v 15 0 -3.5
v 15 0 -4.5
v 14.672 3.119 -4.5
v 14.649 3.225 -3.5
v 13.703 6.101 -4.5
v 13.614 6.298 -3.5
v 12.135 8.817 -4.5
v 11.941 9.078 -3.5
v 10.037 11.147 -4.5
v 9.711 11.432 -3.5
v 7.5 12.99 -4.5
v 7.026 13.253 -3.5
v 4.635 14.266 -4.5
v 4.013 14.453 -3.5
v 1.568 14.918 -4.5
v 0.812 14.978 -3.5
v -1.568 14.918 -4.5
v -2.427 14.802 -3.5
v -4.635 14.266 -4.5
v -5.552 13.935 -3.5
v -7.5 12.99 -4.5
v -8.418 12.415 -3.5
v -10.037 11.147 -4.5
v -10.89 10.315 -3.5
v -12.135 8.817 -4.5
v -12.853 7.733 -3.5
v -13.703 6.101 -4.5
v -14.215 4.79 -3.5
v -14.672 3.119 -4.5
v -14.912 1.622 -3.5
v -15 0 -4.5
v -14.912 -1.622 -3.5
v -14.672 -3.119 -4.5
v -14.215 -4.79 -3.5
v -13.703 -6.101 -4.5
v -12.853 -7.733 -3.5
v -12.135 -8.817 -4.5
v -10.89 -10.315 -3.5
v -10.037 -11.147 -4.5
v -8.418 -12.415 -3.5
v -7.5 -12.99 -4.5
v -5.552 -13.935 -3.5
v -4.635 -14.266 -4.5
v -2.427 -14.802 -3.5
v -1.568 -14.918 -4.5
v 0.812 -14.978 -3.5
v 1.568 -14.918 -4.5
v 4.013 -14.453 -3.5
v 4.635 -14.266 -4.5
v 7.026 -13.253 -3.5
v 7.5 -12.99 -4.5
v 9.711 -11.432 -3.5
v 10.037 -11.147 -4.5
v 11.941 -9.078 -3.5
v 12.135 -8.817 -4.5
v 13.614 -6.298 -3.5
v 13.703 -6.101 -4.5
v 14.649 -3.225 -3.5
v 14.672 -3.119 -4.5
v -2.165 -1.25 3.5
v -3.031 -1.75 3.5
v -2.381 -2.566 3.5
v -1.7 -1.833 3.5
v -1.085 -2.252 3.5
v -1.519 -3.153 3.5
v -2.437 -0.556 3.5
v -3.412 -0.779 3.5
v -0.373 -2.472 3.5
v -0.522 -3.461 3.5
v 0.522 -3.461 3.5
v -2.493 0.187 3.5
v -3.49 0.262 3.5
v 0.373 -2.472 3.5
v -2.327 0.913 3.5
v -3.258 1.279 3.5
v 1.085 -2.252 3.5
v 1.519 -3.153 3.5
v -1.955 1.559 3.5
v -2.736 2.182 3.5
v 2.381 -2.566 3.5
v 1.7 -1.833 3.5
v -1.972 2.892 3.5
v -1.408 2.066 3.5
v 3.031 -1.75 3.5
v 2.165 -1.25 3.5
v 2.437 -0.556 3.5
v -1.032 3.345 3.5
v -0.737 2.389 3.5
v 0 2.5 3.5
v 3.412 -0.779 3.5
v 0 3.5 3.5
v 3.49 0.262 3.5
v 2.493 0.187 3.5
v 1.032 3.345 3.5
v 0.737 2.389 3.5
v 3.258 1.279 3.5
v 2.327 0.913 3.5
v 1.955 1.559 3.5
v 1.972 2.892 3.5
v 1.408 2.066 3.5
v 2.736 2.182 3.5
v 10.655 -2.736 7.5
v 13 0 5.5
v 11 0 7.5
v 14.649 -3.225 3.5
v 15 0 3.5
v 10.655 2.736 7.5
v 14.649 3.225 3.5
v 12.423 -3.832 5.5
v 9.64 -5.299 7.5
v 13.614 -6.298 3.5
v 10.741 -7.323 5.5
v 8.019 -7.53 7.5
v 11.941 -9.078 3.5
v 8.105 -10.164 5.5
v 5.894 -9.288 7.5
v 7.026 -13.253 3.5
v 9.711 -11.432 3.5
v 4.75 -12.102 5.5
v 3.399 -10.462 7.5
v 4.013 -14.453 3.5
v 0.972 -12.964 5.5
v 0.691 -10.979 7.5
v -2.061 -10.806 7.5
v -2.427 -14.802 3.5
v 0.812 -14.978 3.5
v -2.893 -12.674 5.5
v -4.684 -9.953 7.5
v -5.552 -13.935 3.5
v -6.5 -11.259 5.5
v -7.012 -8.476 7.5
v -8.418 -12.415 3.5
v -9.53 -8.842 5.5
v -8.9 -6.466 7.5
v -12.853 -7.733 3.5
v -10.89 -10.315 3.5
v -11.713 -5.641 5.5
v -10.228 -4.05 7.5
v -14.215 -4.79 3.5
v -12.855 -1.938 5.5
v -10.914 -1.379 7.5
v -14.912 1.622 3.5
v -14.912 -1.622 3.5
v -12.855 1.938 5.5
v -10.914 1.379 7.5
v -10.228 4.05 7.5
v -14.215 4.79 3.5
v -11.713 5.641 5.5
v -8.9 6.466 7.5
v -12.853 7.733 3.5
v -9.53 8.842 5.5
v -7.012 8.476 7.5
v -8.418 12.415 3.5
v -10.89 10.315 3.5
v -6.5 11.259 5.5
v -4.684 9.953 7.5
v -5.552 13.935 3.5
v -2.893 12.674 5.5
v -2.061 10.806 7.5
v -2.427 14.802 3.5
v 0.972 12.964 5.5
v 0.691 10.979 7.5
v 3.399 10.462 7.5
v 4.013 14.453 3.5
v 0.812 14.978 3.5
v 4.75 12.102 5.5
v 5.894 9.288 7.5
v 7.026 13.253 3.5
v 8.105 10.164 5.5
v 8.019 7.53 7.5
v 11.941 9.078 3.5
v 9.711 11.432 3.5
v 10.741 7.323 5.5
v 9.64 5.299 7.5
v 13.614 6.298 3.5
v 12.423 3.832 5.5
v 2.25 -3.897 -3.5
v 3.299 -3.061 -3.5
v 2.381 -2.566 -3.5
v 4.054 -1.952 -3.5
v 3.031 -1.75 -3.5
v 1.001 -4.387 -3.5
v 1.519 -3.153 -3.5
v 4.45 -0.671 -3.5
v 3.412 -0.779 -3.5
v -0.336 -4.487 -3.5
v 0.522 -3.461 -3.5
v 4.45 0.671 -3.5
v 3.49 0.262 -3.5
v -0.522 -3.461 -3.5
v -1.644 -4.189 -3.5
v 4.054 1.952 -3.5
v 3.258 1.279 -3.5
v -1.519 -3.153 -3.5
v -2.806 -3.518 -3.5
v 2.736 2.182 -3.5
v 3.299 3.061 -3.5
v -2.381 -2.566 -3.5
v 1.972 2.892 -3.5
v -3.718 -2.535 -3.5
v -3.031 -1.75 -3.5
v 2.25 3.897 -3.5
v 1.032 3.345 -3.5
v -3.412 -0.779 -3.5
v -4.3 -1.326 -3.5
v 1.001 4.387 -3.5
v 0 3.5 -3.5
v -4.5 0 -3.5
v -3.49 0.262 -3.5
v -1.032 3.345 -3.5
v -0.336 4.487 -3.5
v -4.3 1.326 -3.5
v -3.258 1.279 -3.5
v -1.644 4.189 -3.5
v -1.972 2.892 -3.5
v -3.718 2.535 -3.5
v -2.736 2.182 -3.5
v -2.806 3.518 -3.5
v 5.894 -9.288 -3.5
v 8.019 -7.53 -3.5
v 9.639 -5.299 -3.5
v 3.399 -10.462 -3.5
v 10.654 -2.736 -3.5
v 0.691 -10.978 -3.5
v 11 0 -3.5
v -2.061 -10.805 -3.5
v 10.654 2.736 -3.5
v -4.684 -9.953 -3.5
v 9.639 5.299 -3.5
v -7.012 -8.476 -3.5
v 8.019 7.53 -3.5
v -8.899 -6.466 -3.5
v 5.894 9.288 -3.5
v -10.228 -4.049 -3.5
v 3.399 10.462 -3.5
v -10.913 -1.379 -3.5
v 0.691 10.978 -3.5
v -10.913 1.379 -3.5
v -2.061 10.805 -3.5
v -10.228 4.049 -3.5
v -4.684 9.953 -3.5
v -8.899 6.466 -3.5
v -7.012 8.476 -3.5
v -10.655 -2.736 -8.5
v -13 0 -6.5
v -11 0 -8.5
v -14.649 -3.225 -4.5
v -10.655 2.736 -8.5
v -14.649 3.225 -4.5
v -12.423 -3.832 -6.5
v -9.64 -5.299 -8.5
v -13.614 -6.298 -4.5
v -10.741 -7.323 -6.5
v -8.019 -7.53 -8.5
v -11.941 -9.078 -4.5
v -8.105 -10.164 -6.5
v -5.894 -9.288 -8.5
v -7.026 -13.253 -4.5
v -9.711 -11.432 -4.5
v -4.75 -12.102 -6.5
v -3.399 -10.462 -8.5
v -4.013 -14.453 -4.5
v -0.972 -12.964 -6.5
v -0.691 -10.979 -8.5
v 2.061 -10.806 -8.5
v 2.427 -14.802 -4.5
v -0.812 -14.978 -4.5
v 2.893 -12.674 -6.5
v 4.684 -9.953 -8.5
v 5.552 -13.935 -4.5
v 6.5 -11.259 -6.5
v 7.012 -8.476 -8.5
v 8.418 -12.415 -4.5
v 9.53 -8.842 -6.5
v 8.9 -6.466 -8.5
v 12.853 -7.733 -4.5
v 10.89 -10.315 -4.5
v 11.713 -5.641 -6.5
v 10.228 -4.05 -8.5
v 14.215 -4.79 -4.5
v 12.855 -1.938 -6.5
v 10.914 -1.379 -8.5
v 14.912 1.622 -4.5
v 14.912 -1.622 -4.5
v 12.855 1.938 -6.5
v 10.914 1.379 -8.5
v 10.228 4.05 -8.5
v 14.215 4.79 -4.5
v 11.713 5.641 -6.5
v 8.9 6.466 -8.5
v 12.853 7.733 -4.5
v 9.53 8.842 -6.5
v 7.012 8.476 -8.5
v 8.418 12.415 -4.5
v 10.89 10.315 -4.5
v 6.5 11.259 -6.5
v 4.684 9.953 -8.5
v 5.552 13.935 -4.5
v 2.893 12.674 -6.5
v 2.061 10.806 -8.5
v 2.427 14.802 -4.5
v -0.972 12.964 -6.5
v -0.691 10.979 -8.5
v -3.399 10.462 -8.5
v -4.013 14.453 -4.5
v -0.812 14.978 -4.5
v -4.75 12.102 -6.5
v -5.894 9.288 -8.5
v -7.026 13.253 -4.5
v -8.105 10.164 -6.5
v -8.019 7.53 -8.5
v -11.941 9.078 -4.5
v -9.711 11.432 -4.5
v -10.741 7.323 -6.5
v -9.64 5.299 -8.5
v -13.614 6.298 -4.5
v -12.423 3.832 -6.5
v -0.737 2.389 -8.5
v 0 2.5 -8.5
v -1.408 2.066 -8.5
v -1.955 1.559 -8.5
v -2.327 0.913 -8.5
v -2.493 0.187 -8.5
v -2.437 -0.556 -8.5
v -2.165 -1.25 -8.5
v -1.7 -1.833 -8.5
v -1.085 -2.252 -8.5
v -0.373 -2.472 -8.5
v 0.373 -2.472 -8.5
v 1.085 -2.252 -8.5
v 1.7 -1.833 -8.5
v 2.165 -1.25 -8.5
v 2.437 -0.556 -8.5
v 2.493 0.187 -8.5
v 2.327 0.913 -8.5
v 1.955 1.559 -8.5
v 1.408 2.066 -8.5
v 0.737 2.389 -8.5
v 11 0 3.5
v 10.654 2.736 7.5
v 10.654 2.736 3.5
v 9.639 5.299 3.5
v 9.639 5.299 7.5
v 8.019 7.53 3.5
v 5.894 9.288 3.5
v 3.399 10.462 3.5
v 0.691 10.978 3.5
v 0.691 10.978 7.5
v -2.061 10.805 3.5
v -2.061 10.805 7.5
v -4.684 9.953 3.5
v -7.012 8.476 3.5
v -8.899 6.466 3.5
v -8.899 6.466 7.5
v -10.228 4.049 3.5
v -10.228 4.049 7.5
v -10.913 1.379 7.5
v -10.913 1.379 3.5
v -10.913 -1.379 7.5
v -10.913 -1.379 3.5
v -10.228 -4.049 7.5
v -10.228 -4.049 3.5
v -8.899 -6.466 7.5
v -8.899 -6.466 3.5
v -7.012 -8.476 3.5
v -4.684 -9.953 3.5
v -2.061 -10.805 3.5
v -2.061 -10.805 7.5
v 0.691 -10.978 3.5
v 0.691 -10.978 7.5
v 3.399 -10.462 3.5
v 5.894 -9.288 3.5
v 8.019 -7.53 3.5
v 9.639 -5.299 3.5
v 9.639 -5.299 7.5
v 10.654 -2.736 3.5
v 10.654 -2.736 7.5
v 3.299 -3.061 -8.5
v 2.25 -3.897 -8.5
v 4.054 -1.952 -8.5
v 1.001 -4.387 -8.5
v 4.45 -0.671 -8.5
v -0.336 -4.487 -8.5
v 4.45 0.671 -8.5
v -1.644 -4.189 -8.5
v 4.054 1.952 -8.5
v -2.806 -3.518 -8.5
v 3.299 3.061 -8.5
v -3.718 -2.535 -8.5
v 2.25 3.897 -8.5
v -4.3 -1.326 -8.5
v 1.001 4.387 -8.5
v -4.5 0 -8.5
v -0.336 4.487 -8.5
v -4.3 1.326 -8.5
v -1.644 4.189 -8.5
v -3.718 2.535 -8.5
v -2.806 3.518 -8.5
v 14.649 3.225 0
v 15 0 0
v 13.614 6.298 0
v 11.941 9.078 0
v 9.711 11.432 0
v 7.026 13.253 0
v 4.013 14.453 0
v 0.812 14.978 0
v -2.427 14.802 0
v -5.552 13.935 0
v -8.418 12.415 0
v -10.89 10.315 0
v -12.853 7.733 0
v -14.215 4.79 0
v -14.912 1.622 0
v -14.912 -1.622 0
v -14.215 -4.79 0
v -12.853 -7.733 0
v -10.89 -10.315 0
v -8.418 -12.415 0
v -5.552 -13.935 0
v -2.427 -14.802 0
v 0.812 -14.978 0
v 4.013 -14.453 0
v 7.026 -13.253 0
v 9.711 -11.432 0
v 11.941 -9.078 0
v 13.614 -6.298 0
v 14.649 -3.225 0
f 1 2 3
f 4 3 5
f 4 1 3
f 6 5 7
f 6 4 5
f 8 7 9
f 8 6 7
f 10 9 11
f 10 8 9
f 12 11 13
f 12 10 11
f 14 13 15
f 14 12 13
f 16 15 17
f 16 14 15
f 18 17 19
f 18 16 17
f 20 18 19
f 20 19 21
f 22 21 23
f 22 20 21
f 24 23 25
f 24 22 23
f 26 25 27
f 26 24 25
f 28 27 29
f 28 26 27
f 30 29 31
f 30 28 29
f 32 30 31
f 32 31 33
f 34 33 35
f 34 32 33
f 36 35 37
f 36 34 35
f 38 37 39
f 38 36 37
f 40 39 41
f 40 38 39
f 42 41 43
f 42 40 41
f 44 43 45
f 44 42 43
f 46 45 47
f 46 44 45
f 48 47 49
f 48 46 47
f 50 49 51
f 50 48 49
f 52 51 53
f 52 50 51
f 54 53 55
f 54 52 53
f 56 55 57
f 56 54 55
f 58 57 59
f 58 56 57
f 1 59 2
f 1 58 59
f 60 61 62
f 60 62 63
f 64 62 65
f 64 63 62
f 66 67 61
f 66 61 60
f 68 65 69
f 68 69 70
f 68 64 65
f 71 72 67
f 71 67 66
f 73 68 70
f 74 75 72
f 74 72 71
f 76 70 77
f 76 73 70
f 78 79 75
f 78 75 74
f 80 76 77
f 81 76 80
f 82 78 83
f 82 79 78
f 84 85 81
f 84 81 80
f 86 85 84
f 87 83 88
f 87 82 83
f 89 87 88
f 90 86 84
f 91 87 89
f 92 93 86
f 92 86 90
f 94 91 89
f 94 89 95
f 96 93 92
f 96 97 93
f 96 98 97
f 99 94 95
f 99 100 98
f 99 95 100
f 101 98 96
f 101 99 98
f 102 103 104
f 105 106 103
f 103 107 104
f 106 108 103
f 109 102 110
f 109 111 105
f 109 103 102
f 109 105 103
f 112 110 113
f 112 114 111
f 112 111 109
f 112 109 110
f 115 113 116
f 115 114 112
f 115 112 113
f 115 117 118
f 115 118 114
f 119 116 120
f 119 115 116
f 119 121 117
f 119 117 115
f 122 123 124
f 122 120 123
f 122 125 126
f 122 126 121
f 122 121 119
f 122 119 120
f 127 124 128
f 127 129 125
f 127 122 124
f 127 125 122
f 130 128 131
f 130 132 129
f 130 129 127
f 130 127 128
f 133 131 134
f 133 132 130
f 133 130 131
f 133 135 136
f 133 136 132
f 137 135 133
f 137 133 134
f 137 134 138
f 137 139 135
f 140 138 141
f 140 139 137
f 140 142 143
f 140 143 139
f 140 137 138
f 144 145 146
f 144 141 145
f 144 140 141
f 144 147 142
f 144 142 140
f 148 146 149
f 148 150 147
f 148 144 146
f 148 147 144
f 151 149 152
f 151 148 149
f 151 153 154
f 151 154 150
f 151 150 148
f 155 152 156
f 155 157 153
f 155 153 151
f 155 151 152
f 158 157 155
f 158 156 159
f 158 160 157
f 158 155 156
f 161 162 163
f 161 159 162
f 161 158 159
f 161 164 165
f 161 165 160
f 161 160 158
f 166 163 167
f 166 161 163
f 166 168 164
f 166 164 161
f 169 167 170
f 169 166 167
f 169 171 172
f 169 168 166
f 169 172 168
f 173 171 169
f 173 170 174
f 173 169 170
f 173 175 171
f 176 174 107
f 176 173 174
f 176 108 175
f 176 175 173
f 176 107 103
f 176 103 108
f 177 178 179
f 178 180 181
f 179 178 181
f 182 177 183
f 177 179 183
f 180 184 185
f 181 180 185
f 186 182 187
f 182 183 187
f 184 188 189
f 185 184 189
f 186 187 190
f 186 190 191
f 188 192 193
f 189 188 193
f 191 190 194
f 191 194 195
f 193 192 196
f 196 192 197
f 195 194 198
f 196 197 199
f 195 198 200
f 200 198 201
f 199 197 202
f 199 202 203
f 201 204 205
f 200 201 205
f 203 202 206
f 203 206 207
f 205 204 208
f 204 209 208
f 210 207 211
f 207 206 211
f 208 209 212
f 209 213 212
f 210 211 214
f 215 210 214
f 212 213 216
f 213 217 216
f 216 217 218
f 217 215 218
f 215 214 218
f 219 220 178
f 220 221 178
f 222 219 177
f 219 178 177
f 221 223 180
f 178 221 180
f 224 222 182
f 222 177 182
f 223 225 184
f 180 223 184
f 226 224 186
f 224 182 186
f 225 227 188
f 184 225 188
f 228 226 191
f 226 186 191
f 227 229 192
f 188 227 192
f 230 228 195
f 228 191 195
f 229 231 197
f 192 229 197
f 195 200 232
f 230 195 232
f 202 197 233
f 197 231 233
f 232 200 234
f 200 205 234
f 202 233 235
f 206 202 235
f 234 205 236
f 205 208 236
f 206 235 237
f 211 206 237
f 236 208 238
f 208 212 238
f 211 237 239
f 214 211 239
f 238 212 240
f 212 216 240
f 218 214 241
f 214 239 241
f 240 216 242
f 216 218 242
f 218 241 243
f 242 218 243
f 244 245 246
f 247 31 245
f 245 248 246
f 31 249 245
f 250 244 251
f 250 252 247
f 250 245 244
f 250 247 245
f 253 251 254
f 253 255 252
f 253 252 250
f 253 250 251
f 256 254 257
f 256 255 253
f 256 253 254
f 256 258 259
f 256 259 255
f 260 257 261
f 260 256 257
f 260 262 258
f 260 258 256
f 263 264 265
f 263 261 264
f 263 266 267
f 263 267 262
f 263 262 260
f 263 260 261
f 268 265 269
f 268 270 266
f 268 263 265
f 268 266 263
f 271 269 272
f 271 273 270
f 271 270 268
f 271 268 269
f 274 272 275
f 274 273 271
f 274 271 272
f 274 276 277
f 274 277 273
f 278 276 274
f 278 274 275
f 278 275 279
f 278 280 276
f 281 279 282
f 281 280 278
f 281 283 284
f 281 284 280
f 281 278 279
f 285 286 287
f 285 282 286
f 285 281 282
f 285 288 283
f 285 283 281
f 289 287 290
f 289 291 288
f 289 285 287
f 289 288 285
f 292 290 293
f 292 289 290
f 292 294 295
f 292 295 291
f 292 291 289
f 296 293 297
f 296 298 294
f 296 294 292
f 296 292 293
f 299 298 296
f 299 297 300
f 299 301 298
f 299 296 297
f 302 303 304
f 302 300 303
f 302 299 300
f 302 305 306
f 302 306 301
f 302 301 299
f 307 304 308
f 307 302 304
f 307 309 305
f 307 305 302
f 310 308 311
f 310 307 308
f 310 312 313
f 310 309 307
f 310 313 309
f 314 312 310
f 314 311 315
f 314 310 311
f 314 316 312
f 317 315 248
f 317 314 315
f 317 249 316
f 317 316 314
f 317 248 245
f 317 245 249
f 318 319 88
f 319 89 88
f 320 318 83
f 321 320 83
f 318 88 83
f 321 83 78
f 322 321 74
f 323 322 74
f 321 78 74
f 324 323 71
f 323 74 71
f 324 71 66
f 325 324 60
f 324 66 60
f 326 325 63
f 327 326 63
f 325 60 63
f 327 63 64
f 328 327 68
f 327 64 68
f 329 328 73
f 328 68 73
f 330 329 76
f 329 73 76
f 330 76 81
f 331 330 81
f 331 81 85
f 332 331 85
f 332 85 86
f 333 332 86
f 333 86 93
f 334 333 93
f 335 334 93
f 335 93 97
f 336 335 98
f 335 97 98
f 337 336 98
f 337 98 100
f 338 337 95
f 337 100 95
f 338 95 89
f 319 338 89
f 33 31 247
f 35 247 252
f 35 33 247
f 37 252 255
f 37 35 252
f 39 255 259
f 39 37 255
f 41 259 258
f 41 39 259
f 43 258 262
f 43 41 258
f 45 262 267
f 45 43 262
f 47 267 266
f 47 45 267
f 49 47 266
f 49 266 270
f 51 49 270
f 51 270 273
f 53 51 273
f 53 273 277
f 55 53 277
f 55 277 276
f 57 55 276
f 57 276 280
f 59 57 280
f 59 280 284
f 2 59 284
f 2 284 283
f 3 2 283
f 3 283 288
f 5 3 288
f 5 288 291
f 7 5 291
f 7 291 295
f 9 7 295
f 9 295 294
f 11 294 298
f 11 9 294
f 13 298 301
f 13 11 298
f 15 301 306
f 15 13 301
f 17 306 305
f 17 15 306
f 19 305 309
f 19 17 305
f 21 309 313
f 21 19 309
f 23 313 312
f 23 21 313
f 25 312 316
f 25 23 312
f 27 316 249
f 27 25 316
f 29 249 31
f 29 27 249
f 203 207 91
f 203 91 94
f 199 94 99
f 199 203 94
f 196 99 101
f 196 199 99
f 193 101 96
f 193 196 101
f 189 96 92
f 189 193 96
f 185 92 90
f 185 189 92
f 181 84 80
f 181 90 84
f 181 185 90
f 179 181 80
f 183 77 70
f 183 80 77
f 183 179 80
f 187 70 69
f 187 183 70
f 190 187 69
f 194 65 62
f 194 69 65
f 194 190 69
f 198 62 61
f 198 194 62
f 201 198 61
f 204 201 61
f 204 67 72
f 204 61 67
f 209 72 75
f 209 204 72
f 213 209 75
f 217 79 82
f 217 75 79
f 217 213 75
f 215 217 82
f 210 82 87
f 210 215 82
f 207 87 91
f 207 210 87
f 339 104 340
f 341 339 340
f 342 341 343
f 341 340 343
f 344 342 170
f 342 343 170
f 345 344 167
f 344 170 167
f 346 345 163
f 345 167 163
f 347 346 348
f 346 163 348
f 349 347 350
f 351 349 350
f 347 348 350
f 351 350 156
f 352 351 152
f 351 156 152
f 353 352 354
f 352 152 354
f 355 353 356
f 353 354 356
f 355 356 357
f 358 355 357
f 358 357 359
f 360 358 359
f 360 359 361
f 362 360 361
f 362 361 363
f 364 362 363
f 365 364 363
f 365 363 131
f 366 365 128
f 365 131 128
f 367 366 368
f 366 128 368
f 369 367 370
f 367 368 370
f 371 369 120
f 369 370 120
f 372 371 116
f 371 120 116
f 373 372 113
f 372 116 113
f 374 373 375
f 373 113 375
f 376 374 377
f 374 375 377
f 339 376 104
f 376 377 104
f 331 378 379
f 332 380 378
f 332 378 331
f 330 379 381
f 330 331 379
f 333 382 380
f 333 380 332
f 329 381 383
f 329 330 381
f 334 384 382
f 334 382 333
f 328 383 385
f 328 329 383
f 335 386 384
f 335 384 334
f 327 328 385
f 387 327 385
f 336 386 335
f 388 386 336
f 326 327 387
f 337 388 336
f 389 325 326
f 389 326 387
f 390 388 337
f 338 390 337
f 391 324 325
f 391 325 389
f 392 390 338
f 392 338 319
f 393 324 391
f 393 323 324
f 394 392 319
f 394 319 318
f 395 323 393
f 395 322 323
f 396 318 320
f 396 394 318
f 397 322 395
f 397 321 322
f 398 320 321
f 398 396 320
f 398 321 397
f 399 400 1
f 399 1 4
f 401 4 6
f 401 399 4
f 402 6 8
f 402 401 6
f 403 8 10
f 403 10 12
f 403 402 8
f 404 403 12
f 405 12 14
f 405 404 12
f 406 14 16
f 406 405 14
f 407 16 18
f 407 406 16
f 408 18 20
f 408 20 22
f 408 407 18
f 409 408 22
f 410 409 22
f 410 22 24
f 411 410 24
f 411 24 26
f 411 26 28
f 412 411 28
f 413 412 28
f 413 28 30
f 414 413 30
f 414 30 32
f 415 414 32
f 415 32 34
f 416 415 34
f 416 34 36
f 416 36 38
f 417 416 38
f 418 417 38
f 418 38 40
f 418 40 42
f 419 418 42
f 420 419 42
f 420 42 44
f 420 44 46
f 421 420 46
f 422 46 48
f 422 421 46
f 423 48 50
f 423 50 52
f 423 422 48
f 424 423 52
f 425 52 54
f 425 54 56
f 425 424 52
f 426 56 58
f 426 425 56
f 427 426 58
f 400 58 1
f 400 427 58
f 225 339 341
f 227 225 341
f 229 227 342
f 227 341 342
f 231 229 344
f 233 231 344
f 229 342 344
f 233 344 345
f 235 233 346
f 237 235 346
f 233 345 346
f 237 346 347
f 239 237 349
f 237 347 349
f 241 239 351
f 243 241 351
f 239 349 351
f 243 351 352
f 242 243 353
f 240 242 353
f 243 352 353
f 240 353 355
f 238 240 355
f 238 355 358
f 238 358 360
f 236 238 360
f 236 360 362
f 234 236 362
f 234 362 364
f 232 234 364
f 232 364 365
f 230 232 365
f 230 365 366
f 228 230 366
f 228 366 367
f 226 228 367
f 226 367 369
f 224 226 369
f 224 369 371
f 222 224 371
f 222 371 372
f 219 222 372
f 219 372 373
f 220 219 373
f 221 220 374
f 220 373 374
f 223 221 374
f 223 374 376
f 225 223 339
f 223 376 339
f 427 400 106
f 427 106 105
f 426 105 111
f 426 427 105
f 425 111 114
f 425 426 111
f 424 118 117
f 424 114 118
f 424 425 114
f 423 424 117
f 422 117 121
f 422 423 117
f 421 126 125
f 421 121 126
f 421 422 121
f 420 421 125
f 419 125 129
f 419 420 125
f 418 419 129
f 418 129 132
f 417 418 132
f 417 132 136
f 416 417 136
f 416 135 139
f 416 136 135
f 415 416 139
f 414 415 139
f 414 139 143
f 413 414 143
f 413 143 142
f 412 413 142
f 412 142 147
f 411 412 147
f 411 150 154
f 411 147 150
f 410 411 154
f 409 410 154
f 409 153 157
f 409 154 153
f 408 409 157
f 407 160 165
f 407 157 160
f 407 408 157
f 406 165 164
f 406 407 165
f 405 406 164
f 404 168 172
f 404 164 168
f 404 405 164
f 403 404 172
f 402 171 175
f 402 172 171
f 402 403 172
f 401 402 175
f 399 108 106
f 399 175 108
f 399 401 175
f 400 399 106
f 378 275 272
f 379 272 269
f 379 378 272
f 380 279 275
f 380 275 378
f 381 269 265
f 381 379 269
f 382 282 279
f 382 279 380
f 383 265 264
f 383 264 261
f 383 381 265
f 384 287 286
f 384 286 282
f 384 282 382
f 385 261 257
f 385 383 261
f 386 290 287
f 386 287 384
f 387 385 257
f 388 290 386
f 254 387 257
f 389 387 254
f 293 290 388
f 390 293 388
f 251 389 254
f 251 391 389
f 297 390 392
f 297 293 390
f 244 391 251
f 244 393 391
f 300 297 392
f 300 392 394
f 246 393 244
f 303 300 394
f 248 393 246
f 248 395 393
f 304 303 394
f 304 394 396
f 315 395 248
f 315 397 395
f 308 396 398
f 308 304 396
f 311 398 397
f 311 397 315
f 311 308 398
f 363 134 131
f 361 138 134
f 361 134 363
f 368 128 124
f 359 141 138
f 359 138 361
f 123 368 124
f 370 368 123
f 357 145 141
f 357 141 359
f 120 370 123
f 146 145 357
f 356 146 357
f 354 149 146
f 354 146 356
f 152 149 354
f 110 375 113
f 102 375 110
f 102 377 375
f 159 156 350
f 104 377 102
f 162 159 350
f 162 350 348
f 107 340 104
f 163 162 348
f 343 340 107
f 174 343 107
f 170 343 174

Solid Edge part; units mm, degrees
sketch "Sketch1" plane through (0, 0, 0) normal (0, 0, 1) x (1, 0, 0)
  circle A0 centre (0, 0) radius 15
extrude "Protrusion1" add sketch "Sketch1" along normal mid plane 7
sketch "Sketch2" plane through (0, 0, 3.5) normal (0, 0, 1) x (1, 0, 0)
  circle A0 centre (0, 0) radius 11
extrude "ExtrudedCutout_2" cut sketch "Sketch2" against normal blind 28.5
sketch "Sketch3" plane through (0, 0, -3.5) normal (0, 0, -1) x (1, 0, 0)
  circle A0 centre (0, 0) radius 15
extrude "ExtrudedProtrusion_2" add sketch "Sketch3" along normal blind 1
sketch "Sketch4" plane through (0, 0, -4.5) normal (0, 0, -1) x (1, 0, 0)
  circle A0 centre (0, 0) radius 4.5
extrude "ExtrudedCutout_3" cut sketch "Sketch4" against normal blind 57
sketch "Sketch5" plane through (0, 0, 3.5) normal (0, 0, 1) x (1, 0, 0)
  circle A0 centre (0, 0) radius 15
extrude "ExtrudedProtrusion_3" add sketch "Sketch5" along normal blind 4
sketch "Sketch6" plane through (0, 0, 7.5) normal (0, 0, 1) x (1, 0, 0)
  circle A0 centre (0, 0) radius 11
extrude "ExtrudedCutout_4" cut sketch "Sketch6" against normal blind 4
chamfer "Chamfer_1" distance 4 angle 45 1 edges at (-15, 0, 7.5)
sketch "Sketch7" plane through (0, 0, -4.5) normal (0, 0, -1) x (-1, 0, 0)
  circle A0 centre (0, 0) radius 15
extrude "ExtrudedProtrusion_5" add sketch "Sketch7" along normal blind 4
sketch "Sketch8" plane through (0, 0, -8.5) normal (0, 0, -1) x (-1, 0, 0)
  circle A0 centre (0, 0) radius 4.5
extrude "ExtrudedCutout_6" cut sketch "Sketch8" against normal blind 47.5
chamfer "Chamfer_3" distance 4 angle 45 1 edges at (15, 0, -8.5)
sketch "Sketch9" plane through (0, 0, -8.5) normal (0, 0, -1) x (-1, 0, 0)
  circle A0 centre (0, 0) radius 4.5
extrude "Protrusion2" add sketch "Sketch9" against normal up to vertex (5 mm away)
sketch "Sketch10" plane through (0, 0, -3.5) normal (0, 0, 1) x (0, 1, 0)
  circle A0 centre (0, 0) radius 3.5
extrude "ExtrudedProtrusion_7" add sketch "Sketch10" along normal blind 7
sketch "Sketch11" plane through (0, 0, 3.5) normal (0, 0, 1) x (0, 1, 0)
  circle A0 centre (0, 0) radius 2.5
extrude "ExtrudedCutout_7" cut sketch "Sketch11" against normal blind 266
